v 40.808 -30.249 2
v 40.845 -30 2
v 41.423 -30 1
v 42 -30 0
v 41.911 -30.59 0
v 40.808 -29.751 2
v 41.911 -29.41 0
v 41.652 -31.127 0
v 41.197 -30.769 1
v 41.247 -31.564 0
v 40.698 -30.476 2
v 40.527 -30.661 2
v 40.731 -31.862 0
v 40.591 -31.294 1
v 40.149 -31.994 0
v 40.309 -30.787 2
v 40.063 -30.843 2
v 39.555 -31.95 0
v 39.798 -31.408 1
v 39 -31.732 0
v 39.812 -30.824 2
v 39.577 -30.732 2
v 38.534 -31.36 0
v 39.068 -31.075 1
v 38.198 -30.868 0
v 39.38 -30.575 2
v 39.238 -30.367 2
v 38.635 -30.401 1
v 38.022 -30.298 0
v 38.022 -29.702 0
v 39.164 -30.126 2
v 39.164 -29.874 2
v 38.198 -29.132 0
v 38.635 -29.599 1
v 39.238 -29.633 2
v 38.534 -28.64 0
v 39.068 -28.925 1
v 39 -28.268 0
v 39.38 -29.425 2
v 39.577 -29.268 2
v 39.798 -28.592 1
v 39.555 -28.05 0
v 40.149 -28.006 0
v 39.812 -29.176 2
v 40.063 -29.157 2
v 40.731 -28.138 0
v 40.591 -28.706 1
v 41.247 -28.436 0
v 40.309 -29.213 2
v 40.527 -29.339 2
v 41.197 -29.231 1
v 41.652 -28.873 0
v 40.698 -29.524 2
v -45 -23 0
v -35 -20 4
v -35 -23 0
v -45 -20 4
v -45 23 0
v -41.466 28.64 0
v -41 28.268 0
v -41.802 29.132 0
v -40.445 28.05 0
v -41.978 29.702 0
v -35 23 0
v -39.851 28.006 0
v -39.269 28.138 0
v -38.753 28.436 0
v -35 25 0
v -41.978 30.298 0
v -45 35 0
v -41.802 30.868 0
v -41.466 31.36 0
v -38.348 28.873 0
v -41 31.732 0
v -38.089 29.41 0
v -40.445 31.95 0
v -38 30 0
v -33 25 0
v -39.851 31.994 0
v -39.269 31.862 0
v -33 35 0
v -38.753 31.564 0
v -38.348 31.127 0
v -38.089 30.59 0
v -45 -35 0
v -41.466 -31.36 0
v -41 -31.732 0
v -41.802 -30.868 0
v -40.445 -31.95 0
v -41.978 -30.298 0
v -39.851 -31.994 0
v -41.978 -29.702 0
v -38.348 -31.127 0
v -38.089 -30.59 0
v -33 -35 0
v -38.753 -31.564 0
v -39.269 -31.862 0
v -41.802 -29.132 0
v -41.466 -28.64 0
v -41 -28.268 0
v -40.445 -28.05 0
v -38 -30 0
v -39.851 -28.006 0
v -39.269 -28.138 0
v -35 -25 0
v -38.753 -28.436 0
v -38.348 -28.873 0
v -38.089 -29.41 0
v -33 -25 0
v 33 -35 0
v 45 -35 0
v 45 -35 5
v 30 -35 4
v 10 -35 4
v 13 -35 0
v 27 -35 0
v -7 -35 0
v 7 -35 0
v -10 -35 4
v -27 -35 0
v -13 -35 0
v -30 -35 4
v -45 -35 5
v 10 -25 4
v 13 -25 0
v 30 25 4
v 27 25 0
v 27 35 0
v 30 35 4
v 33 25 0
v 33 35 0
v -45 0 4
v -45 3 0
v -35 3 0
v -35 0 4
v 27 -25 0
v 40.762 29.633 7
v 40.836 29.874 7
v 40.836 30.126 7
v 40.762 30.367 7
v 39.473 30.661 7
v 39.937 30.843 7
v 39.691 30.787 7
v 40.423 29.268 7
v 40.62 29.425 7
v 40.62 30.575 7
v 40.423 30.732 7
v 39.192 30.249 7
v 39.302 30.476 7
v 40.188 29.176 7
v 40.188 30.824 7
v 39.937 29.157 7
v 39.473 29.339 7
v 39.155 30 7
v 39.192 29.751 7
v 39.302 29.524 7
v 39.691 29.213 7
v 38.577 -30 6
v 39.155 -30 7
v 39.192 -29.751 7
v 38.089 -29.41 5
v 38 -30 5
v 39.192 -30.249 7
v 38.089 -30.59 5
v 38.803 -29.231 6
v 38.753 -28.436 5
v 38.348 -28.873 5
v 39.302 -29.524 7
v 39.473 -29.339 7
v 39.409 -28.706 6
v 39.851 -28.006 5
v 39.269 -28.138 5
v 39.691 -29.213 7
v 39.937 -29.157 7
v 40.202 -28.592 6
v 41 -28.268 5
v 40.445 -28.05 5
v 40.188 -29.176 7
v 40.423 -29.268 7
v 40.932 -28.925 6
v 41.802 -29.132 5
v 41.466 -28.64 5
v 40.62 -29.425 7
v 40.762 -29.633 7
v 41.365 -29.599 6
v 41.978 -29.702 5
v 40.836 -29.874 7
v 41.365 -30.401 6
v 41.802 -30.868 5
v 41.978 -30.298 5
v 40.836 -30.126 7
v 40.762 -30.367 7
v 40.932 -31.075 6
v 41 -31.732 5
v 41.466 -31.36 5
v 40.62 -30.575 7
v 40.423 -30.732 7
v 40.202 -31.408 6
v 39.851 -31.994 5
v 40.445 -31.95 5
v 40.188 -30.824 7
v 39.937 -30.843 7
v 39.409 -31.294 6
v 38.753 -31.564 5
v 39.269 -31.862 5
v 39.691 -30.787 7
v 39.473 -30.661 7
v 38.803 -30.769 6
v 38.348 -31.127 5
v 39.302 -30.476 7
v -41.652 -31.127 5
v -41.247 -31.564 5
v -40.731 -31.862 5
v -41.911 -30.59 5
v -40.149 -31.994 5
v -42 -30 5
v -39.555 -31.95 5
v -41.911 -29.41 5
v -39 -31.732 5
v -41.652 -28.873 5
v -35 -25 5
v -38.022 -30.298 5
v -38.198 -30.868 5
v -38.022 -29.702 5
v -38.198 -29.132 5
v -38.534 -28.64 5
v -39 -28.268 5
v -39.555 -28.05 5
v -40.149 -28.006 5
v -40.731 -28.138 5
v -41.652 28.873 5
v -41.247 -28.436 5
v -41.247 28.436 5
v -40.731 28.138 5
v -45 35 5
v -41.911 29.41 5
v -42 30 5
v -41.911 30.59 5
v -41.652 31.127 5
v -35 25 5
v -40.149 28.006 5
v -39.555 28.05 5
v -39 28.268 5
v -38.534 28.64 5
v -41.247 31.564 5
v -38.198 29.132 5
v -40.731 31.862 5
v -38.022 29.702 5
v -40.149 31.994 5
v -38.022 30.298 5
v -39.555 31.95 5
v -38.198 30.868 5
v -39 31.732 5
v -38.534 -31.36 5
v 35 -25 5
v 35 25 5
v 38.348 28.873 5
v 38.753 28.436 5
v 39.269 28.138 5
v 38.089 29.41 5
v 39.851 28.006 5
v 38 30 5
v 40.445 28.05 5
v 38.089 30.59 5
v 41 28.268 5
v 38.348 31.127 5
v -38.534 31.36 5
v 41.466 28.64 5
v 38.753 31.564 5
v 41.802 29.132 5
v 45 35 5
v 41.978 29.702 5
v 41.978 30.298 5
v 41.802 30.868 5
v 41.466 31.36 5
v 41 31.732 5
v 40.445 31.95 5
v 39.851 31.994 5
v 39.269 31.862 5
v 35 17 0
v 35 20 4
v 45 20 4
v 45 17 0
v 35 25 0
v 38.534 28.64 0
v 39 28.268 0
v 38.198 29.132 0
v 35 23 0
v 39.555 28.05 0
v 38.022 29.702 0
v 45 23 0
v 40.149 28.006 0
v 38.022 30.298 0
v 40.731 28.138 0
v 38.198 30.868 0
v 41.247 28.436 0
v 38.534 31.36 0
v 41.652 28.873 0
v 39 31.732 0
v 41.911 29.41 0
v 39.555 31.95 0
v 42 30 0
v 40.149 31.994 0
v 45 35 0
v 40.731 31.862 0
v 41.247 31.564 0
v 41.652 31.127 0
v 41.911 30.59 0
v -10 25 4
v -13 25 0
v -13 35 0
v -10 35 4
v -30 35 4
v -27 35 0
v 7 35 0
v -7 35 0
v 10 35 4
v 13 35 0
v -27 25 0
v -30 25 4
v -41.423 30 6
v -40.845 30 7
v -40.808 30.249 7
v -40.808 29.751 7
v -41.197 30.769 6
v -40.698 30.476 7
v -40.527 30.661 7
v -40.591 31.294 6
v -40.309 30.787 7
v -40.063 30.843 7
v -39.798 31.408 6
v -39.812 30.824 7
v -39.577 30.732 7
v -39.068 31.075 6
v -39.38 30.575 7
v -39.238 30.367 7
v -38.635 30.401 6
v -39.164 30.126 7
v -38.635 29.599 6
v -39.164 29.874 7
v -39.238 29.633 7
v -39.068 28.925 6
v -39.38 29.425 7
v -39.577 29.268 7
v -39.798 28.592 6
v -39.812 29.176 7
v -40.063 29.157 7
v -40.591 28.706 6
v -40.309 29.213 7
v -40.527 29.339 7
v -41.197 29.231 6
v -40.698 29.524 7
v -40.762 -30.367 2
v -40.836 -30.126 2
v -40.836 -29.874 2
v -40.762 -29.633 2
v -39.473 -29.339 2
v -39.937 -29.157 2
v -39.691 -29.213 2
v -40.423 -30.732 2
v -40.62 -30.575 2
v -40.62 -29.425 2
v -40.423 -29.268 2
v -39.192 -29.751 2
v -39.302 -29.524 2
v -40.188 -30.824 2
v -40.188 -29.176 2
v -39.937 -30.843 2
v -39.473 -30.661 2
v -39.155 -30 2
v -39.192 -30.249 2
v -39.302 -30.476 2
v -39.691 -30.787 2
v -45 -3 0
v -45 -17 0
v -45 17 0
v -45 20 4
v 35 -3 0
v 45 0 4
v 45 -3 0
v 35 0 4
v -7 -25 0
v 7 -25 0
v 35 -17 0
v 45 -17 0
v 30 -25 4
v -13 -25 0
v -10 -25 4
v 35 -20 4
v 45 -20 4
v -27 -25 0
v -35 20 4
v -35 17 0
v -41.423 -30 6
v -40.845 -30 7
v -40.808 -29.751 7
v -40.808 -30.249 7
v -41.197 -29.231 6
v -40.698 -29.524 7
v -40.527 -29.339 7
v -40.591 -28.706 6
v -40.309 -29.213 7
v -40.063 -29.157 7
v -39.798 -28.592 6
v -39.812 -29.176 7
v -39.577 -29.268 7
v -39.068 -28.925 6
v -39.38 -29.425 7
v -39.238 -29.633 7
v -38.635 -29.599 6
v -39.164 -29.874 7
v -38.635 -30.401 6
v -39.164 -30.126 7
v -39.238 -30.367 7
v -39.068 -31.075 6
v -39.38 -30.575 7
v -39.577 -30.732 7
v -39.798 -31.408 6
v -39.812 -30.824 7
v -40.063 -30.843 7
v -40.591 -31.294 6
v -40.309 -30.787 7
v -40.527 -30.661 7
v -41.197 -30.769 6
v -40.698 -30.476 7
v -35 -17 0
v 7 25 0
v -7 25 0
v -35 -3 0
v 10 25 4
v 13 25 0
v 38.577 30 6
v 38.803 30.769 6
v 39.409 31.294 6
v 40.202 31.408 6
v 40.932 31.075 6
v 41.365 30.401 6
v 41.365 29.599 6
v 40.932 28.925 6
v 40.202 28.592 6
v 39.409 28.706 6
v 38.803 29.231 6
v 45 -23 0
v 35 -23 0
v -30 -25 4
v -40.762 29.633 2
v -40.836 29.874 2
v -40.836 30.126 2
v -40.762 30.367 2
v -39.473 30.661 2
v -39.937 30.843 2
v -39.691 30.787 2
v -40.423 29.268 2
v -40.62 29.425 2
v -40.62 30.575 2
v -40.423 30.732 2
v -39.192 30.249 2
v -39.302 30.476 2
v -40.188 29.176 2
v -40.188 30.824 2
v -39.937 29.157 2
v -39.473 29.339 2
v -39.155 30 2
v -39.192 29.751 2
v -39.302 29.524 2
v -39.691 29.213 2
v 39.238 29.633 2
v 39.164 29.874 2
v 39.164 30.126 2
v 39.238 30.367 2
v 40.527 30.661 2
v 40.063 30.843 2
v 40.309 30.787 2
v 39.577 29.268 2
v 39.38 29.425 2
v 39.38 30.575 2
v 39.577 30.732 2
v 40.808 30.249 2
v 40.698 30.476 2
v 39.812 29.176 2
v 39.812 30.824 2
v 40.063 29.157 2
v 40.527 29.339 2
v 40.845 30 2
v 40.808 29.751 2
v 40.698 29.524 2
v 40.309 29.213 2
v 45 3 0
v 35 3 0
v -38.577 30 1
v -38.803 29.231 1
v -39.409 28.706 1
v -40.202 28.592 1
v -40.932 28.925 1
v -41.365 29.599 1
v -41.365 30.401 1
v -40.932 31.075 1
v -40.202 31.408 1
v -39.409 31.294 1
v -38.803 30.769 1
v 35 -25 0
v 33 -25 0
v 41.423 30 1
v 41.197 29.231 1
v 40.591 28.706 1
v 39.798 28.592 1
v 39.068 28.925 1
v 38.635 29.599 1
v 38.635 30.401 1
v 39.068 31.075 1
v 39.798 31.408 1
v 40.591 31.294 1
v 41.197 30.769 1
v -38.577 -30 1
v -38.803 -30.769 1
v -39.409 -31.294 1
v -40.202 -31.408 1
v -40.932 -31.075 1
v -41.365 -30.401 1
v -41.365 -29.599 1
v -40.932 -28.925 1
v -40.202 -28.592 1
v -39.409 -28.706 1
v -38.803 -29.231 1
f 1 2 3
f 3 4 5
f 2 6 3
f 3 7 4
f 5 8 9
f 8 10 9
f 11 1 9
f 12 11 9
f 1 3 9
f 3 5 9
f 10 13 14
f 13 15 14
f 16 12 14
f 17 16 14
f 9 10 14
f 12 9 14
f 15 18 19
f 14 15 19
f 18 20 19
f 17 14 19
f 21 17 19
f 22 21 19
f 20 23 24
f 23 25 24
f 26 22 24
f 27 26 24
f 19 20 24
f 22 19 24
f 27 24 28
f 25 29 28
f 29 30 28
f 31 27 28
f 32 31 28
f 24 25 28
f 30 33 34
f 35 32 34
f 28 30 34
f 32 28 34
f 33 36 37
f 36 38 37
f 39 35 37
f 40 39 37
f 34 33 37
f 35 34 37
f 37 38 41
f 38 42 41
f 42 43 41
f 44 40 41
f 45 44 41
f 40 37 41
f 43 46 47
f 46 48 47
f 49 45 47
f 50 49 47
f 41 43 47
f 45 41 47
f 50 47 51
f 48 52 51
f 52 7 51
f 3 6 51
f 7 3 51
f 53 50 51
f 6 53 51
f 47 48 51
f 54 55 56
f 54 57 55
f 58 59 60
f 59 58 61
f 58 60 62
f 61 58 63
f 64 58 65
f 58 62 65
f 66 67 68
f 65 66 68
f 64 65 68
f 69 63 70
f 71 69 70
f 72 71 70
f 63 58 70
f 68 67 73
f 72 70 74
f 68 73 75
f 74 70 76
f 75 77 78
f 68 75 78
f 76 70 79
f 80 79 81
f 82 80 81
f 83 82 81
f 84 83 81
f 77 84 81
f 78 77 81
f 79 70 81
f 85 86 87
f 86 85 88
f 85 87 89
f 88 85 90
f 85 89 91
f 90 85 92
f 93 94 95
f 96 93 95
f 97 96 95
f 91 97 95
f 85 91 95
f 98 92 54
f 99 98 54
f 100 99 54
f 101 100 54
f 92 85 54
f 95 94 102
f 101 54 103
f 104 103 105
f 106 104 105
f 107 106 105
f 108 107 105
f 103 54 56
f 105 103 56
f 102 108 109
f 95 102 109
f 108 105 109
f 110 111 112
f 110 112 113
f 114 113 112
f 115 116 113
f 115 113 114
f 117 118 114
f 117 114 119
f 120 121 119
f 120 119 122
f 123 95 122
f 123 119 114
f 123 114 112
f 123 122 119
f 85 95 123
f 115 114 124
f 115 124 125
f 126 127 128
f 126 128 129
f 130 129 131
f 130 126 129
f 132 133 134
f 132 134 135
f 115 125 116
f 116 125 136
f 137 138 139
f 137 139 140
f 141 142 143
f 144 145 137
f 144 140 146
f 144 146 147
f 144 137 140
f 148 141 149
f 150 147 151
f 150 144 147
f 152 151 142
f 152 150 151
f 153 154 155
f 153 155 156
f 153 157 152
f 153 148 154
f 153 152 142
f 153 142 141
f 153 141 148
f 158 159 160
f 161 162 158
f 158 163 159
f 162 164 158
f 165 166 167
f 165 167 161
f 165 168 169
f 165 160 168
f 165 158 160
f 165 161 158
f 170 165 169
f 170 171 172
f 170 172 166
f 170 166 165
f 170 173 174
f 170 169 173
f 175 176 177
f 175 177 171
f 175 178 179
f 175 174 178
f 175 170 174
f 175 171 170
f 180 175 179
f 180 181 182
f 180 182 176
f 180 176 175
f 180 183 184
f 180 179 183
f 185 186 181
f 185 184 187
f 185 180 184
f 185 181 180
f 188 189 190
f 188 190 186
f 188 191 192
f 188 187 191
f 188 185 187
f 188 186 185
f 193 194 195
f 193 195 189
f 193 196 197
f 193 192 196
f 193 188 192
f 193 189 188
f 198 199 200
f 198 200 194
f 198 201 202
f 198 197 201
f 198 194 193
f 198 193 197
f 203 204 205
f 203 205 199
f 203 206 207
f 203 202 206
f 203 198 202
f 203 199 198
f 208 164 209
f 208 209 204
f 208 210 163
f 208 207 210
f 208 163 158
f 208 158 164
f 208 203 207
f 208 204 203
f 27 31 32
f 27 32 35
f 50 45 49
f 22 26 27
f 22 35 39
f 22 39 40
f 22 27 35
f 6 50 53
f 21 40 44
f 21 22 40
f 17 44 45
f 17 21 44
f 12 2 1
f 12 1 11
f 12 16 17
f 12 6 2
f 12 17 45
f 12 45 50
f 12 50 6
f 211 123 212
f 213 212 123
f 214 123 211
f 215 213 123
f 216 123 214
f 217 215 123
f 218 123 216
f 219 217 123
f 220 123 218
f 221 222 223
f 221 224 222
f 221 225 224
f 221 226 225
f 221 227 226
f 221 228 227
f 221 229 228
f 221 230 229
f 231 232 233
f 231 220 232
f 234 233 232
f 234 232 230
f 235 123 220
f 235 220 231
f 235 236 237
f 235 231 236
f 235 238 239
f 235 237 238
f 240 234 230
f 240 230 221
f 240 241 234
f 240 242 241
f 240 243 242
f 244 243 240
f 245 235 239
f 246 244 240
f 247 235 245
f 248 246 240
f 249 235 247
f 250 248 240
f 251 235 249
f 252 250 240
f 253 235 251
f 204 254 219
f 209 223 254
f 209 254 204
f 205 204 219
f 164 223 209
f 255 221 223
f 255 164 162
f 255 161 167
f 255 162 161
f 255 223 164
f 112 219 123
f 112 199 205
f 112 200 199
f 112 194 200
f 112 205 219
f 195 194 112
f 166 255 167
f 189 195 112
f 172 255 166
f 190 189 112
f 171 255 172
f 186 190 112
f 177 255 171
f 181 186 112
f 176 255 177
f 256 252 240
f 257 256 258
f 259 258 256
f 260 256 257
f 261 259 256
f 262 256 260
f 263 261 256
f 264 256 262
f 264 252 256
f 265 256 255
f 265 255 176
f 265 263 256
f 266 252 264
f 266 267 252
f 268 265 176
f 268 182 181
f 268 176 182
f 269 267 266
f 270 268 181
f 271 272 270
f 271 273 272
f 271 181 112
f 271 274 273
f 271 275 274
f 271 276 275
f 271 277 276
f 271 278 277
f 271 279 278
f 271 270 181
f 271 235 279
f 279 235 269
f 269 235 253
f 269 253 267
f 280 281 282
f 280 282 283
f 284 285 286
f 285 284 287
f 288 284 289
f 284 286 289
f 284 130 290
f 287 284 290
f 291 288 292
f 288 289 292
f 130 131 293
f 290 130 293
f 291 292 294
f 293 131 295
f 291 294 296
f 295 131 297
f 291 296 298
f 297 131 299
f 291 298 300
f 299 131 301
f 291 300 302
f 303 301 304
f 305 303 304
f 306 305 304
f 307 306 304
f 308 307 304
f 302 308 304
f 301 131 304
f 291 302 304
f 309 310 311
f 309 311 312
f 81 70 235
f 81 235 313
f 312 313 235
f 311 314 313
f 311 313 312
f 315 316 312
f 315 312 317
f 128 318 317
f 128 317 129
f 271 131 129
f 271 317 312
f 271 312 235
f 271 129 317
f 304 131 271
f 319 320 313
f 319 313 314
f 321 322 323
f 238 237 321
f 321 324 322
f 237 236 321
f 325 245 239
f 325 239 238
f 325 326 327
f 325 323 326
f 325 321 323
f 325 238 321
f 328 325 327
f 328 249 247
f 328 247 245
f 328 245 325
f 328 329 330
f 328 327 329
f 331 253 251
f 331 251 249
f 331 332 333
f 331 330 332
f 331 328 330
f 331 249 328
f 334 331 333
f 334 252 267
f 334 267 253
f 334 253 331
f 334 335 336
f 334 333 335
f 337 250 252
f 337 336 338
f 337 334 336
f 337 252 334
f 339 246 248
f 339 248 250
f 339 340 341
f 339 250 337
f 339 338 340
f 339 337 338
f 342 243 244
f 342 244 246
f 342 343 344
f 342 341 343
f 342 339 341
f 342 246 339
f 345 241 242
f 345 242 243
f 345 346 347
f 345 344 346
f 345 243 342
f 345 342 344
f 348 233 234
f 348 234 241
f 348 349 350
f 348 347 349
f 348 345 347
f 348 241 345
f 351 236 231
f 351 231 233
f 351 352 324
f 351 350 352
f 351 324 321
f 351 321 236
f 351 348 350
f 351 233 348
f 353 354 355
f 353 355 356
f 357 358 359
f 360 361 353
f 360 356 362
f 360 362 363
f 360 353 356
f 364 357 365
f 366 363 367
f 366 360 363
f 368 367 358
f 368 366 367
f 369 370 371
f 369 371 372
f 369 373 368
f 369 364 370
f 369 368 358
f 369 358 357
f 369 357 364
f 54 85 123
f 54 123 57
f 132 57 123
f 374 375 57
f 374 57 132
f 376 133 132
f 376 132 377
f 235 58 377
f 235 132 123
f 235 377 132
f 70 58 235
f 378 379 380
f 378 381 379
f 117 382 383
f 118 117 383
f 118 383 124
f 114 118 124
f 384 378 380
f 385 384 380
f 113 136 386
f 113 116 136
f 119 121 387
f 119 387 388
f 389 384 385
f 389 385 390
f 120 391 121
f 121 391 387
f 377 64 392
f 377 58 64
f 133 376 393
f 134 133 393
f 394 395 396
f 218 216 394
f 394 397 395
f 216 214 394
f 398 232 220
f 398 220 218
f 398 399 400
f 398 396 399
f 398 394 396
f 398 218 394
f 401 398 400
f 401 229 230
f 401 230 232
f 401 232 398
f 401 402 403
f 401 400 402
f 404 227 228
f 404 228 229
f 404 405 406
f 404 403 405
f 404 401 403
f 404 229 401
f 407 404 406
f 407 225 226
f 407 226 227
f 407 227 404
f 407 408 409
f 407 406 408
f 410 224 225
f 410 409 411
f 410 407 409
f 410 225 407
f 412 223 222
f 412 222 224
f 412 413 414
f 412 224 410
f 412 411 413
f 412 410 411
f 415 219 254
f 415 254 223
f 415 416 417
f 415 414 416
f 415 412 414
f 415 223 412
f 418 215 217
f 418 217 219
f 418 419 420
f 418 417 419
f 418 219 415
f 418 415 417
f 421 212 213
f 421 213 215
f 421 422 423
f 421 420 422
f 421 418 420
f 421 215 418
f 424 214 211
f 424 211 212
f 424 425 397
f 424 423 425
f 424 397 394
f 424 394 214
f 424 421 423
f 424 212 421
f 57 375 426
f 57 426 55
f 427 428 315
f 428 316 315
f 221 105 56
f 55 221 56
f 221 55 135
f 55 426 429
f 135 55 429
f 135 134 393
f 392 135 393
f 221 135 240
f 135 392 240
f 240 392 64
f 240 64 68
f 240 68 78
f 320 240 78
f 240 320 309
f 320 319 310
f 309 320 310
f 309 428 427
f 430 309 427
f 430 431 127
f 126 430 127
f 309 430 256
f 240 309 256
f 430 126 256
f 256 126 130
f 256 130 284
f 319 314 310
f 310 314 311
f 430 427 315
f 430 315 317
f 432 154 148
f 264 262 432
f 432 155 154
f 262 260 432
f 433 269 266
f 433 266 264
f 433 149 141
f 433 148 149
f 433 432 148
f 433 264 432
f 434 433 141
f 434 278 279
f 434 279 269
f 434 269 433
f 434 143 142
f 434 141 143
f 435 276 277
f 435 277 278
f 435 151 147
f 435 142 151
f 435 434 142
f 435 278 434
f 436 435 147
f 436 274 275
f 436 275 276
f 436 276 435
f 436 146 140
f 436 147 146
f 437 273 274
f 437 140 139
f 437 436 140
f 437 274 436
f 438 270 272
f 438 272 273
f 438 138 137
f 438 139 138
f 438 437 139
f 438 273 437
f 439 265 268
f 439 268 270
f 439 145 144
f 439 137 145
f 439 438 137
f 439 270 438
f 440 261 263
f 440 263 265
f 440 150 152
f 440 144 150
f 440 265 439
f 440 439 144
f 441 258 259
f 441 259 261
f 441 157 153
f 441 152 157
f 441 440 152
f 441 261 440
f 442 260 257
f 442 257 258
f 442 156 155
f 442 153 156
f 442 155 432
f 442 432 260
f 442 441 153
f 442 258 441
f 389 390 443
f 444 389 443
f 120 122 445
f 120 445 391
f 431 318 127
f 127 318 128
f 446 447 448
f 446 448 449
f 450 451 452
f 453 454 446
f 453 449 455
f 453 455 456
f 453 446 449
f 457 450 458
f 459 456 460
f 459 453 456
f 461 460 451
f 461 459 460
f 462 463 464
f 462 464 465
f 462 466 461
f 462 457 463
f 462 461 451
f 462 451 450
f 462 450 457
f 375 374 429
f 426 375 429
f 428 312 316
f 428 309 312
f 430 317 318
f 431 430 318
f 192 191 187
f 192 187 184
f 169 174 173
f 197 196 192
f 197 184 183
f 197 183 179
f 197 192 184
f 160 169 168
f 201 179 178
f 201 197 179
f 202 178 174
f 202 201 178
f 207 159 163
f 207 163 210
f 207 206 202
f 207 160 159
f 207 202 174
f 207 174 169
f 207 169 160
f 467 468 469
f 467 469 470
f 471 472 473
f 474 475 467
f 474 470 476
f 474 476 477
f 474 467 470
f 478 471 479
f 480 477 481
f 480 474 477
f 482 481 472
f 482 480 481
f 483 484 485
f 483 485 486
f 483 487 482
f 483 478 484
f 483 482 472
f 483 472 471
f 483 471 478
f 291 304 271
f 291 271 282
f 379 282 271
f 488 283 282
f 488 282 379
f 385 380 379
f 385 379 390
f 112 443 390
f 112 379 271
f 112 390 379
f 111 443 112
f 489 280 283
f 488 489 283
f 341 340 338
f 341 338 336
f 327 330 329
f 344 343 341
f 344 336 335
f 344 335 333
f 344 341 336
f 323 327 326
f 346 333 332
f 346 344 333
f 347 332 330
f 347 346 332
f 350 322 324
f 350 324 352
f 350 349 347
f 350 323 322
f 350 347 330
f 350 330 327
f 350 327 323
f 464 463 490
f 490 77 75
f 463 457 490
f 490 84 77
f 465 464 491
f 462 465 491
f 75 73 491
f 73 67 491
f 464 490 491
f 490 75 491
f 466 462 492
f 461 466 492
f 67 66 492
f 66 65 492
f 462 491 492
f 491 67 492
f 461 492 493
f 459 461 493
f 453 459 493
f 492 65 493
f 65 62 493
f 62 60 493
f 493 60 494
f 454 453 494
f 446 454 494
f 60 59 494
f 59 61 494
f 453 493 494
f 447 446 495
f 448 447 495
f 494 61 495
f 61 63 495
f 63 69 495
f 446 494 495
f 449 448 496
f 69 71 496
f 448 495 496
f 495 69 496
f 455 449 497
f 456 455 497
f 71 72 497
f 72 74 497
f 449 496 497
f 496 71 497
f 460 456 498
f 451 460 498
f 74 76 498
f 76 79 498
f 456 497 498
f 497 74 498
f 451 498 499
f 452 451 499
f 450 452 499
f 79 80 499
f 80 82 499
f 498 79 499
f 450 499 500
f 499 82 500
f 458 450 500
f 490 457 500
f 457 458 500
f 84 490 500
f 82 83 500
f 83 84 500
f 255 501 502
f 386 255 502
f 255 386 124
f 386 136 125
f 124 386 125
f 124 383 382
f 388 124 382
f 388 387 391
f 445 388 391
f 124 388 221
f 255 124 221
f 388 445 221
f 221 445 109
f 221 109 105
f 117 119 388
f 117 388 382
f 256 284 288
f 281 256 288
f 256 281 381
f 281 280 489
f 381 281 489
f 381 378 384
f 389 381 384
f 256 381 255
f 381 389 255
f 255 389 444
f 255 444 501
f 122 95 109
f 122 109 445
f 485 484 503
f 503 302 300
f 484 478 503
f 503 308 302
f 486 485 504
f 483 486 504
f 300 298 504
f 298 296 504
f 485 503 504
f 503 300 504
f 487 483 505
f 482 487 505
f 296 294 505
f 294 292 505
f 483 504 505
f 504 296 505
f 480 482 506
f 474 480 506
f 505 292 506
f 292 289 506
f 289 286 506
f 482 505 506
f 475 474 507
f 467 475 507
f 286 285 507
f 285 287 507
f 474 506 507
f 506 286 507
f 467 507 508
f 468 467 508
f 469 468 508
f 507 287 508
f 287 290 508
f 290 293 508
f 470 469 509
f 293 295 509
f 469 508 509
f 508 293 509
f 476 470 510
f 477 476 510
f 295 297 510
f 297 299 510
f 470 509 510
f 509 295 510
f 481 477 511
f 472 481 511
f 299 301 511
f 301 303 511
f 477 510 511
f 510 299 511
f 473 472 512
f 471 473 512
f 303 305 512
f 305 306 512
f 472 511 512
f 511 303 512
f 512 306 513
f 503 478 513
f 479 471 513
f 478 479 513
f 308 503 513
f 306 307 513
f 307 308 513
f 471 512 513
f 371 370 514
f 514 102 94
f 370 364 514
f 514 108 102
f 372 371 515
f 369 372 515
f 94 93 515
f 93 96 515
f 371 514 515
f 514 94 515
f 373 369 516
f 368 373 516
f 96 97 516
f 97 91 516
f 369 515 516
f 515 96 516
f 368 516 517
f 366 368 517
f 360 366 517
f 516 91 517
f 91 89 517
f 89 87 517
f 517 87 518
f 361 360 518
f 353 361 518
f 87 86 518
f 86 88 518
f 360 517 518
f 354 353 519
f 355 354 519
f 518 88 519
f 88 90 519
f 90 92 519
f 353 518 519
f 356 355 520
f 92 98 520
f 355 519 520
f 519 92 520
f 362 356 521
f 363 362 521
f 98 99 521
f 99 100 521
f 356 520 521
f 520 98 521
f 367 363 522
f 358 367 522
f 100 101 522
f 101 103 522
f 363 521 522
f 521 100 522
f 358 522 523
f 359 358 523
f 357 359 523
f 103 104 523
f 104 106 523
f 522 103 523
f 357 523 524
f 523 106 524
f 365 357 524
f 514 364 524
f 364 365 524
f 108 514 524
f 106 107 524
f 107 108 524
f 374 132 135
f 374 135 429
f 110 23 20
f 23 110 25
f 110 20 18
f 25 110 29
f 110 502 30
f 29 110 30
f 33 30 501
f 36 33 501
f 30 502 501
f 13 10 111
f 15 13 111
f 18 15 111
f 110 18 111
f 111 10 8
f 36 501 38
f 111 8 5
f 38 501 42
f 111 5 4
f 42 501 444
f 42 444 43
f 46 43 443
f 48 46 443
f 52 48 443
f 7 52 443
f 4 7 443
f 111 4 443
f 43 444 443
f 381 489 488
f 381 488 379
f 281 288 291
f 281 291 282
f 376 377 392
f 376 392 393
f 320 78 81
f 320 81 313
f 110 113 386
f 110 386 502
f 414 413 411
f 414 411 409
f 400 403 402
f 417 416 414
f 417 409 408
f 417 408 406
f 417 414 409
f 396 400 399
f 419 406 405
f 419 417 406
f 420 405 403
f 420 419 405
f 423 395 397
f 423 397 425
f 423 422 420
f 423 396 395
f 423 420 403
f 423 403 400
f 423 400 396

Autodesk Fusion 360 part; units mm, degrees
sketch "Sketch1" plane through (0, 0, 0) normal (0, 0, 1) x (1, 0, 0)
  line L0 (-45, 35) -> (45, 35)
  line L1 (45, 35) -> (45, -35)
  line L2 (45, -35) -> (-45, -35)
  line L3 (-45, -35) -> (-45, 35)
  line L4 (-45, 35) -> (45, -35) construction
  line L5 (45, 35) -> (-45, -35) construction
  line L6 (-35, 25) -> (35, 25)
  line L7 (35, 25) -> (35, -25)
  line L8 (35, -25) -> (-35, -25)
  line L9 (-35, -25) -> (-35, 25)
  line L10 (-35, 25) -> (35, -25) construction
  line L11 (35, 25) -> (-35, -25) construction
  dimension "d1" = 90
  dimension "d2" = 70
  dimension "d3" = 10
  dimension "d4" = 10
extrude "Extrude1" add sketch "Sketch1" along normal blind 5
sketch "Sketch2" plane through (0, -35, 0) normal (0, -1, 0) x (1, 0, 0)
  line L0 (-45, 0) -> (45, 0)
  line L1 (45, 0) -> (45, 5)
  line L2 (45, 5) -> (-45, 5)
  line L3 (-33, 0) -> (-30, 4)
  line L4 (-30, 4) -> (-27, 0)
  line L5 (-33, 0) -> (-27, 0)
  dimension "d37" = 4
  dimension "d40" = 15
  dimension "d41" = 6
extrude "Extrude2" cut sketch "Sketch2" against normal through all
pattern_linear "R-Pattern1" count 4 spacing 20 along (1, 0, 0) of "Extrude2"
sketch "Sketch3" plane through (-45, 0, 0) normal (-1, 0, 0) x (0, -1, 0)
  line L0 (-35, 0) -> (35, 0)
  line L1 (35, 0) -> (35, 5)
  line L2 (35, 5) -> (-35, 5)
  line L3 (-23, 0) -> (-20, 4)
  line L4 (-20, 4) -> (-17, 0)
  dimension "d42" = 6
  dimension "d43" = 4
  dimension "d44" = 15
extrude "Extrude3" cut sketch "Sketch3" against normal through all
pattern_linear "R-Pattern2" count 3 spacing 20 along (0, -1, 0) of "Extrude3"
sketch "Sketch4" plane through (0, 0, 5) normal (0, 0, 1) x (-1, 0, 0)
  line L0 (45, -35) -> (45, 35)
  line L1 (45, 35) -> (-45, 35)
  line L2 (-35, 25) -> (35, 25)
  line L3 (35, 25) -> (35, -25)
  circle A0 centre (40, 30) radius 2
  line L4 (35, -25) -> (-35, -25)
  line L5 (-35, -25) -> (-35, 25)
  line L6 (-45, 35) -> (-45, -35)
  line L7 (-45, -35) -> (45, -35)
  dimension "d23" = 5
  dimension "d24" = 5
  dimension "d25" = 4
extrude "Extrude4" add sketch "Sketch4" along normal blind 2 draft -30 contours A0
sketch "Sketch5" plane through (0, 0, 0) normal (0, 0, -1) x (1, 0, 0)
  circle A0 centre (-40, 30) radius 2
  line L0 (45, -23) -> (35, -23)
  line L1 (-45, 35) -> (-45, 23)
  line L2 (33, -35) -> (45, -35)
  line L3 (-33, 25) -> (-33, 35)
  line L4 (35, -25) -> (33, -25)
  line L5 (-35, 23) -> (-35, 25)
  line L6 (35, -23) -> (35, -25)
  line L7 (33, -25) -> (33, -35)
  line L8 (45, -35) -> (45, -23)
  line L9 (-33, 35) -> (-45, 35)
  line L10 (-45, 35) -> (-45, 23)
  line L11 (-45, 23) -> (-35, 23)
  line L12 (-35, 25) -> (-33, 25)
  line L13 (-33, 35) -> (-45, 35)
  line L14 (35, 23) -> (45, 23)
  line L15 (45, 23) -> (45, 35)
  line L16 (45, 35) -> (33, 35)
  line L17 (33, 35) -> (33, 25)
  line L18 (33, 25) -> (35, 25)
  line L19 (35, 25) -> (35, 23)
  line L20 (-35, -23) -> (-45, -23)
  line L21 (-45, -23) -> (-45, -35)
  line L22 (-45, -35) -> (-33, -35)
  line L23 (-33, -35) -> (-33, -25)
  line L24 (-33, -25) -> (-35, -25)
  line L25 (-35, -25) -> (-35, -23)
  dimension "d30" = 4
  dimension "d45" = 5
  dimension "d46" = 5
extrude "Extrude5" cut sketch "Sketch5" against normal blind 2 draft -30 contours A0
pattern_linear "R-Pattern3" count 2 spacing 80 along (1, 0, 0) count 2 spacing 60 along (0, 1, 0) of "Extrude4", "Extrude5"
